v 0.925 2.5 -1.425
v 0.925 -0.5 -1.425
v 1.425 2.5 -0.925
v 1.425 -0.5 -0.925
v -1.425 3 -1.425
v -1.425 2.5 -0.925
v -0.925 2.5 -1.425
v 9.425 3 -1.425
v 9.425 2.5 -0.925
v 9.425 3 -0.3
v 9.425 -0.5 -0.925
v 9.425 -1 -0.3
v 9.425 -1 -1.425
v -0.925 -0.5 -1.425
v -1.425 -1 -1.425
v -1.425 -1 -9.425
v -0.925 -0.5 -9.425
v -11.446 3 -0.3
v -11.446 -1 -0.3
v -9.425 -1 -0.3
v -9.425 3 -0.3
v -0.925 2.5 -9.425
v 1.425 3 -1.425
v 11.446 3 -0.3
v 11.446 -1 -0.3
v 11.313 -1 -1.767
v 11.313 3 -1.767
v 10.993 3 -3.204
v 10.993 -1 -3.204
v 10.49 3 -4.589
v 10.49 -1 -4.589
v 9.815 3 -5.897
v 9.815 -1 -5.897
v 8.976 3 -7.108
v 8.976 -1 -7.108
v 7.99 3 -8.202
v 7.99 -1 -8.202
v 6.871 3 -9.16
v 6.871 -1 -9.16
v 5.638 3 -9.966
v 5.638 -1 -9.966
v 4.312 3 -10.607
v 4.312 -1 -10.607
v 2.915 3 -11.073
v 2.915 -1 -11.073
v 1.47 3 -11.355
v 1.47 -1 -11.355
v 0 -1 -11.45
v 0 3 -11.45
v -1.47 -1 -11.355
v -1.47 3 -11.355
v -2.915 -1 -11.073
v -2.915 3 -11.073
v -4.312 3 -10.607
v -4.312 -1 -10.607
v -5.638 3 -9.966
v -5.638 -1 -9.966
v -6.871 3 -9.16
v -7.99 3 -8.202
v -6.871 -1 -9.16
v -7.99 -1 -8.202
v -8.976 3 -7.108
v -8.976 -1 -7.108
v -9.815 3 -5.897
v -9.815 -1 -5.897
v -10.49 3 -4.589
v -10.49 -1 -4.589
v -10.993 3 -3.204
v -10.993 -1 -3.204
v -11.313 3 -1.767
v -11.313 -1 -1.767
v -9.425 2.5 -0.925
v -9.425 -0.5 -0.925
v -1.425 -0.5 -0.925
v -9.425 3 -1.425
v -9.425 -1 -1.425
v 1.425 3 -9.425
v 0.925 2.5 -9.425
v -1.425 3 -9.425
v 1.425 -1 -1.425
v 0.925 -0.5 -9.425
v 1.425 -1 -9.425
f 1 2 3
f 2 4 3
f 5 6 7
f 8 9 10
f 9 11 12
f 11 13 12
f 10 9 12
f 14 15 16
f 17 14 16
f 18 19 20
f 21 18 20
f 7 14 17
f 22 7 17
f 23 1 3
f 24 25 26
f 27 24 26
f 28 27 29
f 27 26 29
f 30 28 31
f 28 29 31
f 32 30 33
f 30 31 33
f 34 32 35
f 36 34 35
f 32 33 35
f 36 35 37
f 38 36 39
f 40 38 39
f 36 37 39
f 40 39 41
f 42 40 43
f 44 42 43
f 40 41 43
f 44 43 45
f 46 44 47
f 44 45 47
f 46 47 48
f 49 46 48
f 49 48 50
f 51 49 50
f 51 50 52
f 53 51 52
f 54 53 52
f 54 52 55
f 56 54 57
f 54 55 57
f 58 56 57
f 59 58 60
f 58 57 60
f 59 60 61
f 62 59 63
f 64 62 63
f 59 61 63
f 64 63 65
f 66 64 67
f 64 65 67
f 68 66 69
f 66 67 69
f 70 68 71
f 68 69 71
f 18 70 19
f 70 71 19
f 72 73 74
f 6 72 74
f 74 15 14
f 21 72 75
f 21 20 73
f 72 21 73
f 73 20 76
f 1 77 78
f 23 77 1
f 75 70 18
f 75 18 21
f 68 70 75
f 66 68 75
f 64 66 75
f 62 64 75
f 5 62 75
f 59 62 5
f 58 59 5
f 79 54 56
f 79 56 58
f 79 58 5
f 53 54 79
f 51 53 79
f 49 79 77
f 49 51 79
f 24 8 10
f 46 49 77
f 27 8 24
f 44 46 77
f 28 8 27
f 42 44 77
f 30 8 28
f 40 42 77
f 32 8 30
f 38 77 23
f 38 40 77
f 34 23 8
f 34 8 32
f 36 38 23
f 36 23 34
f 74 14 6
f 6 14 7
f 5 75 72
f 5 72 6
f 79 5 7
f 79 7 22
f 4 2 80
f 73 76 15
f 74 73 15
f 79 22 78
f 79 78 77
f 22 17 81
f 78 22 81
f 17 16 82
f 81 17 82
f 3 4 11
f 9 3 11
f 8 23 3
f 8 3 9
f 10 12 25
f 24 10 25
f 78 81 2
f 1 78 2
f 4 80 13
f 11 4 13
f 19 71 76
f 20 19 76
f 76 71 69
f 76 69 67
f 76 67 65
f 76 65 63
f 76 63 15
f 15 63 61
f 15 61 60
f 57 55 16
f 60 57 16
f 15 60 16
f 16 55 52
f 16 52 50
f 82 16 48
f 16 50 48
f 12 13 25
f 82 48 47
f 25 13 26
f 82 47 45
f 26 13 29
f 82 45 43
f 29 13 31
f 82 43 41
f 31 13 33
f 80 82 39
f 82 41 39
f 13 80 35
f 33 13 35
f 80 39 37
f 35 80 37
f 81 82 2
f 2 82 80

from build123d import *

# Parameters (mm, degrees)
BOSS_EXTRUDE1_DEPTH      = 3
BOSS_EXTRUDE1_DEPTH_BACK = 1
CHAMFER1_SIZE            = 0.5


with BuildPart() as part:
    # Sketch2 → Boss-Extrude1 (new, two sides: drawn at the far end of the back side and taken through both)
    with BuildSketch(Plane(origin=(0, 0, 0), x_dir=(1, 0, 0), z_dir=(0, 1, 0)).offset(-BOSS_EXTRUDE1_DEPTH_BACK)):
        with BuildLine():
            Line((-9.425, 0.3), (-9.425, 0.925))
            Line((-9.425, 0.925), (-0.925, 0.925))
            Line((-0.925, 0.925), (-0.925, 9.425))
            Line((-0.925, 9.425), (0, 9.425))
            Line((0, 9.425), (0.925, 9.425))
            Line((0.925, 9.425), (0.925, 0.925))
            Line((0.925, 0.925), (9.425, 0.925))
            Line((9.425, 0.925), (9.425, 0.3))
            Line((9.425, 0.3), (11.446169588, 0.3))
            ThreePointArc((11.446169588, 0.3), (0, 11.45010036), (-11.446169588, 0.3))
            Line((-11.446169588, 0.3), (-9.425, 0.3))
        make_face()
    extrude(amount=BOSS_EXTRUDE1_DEPTH + BOSS_EXTRUDE1_DEPTH_BACK)

    # Chamfer1
    chamfer1_edges = [part.edges().sort_by_distance(p)[0] for p in [
        (-5.175, -1, -0.925),
        (-0.925, -1, -5.175),
        (0.925, 1, -0.925),
        (-0.925, 1, -0.925),
        (0.925, -1, -5.175),
        (-5.175, 3, -0.925),
        (-0.925, 3, -5.175),
        (0.925, 3, -5.175),
        (5.175, 3, -0.925),
        (5.175, -1, -0.925),
    ]]
    chamfer(chamfer1_edges, length=CHAMFER1_SIZE)


solid = part.part
